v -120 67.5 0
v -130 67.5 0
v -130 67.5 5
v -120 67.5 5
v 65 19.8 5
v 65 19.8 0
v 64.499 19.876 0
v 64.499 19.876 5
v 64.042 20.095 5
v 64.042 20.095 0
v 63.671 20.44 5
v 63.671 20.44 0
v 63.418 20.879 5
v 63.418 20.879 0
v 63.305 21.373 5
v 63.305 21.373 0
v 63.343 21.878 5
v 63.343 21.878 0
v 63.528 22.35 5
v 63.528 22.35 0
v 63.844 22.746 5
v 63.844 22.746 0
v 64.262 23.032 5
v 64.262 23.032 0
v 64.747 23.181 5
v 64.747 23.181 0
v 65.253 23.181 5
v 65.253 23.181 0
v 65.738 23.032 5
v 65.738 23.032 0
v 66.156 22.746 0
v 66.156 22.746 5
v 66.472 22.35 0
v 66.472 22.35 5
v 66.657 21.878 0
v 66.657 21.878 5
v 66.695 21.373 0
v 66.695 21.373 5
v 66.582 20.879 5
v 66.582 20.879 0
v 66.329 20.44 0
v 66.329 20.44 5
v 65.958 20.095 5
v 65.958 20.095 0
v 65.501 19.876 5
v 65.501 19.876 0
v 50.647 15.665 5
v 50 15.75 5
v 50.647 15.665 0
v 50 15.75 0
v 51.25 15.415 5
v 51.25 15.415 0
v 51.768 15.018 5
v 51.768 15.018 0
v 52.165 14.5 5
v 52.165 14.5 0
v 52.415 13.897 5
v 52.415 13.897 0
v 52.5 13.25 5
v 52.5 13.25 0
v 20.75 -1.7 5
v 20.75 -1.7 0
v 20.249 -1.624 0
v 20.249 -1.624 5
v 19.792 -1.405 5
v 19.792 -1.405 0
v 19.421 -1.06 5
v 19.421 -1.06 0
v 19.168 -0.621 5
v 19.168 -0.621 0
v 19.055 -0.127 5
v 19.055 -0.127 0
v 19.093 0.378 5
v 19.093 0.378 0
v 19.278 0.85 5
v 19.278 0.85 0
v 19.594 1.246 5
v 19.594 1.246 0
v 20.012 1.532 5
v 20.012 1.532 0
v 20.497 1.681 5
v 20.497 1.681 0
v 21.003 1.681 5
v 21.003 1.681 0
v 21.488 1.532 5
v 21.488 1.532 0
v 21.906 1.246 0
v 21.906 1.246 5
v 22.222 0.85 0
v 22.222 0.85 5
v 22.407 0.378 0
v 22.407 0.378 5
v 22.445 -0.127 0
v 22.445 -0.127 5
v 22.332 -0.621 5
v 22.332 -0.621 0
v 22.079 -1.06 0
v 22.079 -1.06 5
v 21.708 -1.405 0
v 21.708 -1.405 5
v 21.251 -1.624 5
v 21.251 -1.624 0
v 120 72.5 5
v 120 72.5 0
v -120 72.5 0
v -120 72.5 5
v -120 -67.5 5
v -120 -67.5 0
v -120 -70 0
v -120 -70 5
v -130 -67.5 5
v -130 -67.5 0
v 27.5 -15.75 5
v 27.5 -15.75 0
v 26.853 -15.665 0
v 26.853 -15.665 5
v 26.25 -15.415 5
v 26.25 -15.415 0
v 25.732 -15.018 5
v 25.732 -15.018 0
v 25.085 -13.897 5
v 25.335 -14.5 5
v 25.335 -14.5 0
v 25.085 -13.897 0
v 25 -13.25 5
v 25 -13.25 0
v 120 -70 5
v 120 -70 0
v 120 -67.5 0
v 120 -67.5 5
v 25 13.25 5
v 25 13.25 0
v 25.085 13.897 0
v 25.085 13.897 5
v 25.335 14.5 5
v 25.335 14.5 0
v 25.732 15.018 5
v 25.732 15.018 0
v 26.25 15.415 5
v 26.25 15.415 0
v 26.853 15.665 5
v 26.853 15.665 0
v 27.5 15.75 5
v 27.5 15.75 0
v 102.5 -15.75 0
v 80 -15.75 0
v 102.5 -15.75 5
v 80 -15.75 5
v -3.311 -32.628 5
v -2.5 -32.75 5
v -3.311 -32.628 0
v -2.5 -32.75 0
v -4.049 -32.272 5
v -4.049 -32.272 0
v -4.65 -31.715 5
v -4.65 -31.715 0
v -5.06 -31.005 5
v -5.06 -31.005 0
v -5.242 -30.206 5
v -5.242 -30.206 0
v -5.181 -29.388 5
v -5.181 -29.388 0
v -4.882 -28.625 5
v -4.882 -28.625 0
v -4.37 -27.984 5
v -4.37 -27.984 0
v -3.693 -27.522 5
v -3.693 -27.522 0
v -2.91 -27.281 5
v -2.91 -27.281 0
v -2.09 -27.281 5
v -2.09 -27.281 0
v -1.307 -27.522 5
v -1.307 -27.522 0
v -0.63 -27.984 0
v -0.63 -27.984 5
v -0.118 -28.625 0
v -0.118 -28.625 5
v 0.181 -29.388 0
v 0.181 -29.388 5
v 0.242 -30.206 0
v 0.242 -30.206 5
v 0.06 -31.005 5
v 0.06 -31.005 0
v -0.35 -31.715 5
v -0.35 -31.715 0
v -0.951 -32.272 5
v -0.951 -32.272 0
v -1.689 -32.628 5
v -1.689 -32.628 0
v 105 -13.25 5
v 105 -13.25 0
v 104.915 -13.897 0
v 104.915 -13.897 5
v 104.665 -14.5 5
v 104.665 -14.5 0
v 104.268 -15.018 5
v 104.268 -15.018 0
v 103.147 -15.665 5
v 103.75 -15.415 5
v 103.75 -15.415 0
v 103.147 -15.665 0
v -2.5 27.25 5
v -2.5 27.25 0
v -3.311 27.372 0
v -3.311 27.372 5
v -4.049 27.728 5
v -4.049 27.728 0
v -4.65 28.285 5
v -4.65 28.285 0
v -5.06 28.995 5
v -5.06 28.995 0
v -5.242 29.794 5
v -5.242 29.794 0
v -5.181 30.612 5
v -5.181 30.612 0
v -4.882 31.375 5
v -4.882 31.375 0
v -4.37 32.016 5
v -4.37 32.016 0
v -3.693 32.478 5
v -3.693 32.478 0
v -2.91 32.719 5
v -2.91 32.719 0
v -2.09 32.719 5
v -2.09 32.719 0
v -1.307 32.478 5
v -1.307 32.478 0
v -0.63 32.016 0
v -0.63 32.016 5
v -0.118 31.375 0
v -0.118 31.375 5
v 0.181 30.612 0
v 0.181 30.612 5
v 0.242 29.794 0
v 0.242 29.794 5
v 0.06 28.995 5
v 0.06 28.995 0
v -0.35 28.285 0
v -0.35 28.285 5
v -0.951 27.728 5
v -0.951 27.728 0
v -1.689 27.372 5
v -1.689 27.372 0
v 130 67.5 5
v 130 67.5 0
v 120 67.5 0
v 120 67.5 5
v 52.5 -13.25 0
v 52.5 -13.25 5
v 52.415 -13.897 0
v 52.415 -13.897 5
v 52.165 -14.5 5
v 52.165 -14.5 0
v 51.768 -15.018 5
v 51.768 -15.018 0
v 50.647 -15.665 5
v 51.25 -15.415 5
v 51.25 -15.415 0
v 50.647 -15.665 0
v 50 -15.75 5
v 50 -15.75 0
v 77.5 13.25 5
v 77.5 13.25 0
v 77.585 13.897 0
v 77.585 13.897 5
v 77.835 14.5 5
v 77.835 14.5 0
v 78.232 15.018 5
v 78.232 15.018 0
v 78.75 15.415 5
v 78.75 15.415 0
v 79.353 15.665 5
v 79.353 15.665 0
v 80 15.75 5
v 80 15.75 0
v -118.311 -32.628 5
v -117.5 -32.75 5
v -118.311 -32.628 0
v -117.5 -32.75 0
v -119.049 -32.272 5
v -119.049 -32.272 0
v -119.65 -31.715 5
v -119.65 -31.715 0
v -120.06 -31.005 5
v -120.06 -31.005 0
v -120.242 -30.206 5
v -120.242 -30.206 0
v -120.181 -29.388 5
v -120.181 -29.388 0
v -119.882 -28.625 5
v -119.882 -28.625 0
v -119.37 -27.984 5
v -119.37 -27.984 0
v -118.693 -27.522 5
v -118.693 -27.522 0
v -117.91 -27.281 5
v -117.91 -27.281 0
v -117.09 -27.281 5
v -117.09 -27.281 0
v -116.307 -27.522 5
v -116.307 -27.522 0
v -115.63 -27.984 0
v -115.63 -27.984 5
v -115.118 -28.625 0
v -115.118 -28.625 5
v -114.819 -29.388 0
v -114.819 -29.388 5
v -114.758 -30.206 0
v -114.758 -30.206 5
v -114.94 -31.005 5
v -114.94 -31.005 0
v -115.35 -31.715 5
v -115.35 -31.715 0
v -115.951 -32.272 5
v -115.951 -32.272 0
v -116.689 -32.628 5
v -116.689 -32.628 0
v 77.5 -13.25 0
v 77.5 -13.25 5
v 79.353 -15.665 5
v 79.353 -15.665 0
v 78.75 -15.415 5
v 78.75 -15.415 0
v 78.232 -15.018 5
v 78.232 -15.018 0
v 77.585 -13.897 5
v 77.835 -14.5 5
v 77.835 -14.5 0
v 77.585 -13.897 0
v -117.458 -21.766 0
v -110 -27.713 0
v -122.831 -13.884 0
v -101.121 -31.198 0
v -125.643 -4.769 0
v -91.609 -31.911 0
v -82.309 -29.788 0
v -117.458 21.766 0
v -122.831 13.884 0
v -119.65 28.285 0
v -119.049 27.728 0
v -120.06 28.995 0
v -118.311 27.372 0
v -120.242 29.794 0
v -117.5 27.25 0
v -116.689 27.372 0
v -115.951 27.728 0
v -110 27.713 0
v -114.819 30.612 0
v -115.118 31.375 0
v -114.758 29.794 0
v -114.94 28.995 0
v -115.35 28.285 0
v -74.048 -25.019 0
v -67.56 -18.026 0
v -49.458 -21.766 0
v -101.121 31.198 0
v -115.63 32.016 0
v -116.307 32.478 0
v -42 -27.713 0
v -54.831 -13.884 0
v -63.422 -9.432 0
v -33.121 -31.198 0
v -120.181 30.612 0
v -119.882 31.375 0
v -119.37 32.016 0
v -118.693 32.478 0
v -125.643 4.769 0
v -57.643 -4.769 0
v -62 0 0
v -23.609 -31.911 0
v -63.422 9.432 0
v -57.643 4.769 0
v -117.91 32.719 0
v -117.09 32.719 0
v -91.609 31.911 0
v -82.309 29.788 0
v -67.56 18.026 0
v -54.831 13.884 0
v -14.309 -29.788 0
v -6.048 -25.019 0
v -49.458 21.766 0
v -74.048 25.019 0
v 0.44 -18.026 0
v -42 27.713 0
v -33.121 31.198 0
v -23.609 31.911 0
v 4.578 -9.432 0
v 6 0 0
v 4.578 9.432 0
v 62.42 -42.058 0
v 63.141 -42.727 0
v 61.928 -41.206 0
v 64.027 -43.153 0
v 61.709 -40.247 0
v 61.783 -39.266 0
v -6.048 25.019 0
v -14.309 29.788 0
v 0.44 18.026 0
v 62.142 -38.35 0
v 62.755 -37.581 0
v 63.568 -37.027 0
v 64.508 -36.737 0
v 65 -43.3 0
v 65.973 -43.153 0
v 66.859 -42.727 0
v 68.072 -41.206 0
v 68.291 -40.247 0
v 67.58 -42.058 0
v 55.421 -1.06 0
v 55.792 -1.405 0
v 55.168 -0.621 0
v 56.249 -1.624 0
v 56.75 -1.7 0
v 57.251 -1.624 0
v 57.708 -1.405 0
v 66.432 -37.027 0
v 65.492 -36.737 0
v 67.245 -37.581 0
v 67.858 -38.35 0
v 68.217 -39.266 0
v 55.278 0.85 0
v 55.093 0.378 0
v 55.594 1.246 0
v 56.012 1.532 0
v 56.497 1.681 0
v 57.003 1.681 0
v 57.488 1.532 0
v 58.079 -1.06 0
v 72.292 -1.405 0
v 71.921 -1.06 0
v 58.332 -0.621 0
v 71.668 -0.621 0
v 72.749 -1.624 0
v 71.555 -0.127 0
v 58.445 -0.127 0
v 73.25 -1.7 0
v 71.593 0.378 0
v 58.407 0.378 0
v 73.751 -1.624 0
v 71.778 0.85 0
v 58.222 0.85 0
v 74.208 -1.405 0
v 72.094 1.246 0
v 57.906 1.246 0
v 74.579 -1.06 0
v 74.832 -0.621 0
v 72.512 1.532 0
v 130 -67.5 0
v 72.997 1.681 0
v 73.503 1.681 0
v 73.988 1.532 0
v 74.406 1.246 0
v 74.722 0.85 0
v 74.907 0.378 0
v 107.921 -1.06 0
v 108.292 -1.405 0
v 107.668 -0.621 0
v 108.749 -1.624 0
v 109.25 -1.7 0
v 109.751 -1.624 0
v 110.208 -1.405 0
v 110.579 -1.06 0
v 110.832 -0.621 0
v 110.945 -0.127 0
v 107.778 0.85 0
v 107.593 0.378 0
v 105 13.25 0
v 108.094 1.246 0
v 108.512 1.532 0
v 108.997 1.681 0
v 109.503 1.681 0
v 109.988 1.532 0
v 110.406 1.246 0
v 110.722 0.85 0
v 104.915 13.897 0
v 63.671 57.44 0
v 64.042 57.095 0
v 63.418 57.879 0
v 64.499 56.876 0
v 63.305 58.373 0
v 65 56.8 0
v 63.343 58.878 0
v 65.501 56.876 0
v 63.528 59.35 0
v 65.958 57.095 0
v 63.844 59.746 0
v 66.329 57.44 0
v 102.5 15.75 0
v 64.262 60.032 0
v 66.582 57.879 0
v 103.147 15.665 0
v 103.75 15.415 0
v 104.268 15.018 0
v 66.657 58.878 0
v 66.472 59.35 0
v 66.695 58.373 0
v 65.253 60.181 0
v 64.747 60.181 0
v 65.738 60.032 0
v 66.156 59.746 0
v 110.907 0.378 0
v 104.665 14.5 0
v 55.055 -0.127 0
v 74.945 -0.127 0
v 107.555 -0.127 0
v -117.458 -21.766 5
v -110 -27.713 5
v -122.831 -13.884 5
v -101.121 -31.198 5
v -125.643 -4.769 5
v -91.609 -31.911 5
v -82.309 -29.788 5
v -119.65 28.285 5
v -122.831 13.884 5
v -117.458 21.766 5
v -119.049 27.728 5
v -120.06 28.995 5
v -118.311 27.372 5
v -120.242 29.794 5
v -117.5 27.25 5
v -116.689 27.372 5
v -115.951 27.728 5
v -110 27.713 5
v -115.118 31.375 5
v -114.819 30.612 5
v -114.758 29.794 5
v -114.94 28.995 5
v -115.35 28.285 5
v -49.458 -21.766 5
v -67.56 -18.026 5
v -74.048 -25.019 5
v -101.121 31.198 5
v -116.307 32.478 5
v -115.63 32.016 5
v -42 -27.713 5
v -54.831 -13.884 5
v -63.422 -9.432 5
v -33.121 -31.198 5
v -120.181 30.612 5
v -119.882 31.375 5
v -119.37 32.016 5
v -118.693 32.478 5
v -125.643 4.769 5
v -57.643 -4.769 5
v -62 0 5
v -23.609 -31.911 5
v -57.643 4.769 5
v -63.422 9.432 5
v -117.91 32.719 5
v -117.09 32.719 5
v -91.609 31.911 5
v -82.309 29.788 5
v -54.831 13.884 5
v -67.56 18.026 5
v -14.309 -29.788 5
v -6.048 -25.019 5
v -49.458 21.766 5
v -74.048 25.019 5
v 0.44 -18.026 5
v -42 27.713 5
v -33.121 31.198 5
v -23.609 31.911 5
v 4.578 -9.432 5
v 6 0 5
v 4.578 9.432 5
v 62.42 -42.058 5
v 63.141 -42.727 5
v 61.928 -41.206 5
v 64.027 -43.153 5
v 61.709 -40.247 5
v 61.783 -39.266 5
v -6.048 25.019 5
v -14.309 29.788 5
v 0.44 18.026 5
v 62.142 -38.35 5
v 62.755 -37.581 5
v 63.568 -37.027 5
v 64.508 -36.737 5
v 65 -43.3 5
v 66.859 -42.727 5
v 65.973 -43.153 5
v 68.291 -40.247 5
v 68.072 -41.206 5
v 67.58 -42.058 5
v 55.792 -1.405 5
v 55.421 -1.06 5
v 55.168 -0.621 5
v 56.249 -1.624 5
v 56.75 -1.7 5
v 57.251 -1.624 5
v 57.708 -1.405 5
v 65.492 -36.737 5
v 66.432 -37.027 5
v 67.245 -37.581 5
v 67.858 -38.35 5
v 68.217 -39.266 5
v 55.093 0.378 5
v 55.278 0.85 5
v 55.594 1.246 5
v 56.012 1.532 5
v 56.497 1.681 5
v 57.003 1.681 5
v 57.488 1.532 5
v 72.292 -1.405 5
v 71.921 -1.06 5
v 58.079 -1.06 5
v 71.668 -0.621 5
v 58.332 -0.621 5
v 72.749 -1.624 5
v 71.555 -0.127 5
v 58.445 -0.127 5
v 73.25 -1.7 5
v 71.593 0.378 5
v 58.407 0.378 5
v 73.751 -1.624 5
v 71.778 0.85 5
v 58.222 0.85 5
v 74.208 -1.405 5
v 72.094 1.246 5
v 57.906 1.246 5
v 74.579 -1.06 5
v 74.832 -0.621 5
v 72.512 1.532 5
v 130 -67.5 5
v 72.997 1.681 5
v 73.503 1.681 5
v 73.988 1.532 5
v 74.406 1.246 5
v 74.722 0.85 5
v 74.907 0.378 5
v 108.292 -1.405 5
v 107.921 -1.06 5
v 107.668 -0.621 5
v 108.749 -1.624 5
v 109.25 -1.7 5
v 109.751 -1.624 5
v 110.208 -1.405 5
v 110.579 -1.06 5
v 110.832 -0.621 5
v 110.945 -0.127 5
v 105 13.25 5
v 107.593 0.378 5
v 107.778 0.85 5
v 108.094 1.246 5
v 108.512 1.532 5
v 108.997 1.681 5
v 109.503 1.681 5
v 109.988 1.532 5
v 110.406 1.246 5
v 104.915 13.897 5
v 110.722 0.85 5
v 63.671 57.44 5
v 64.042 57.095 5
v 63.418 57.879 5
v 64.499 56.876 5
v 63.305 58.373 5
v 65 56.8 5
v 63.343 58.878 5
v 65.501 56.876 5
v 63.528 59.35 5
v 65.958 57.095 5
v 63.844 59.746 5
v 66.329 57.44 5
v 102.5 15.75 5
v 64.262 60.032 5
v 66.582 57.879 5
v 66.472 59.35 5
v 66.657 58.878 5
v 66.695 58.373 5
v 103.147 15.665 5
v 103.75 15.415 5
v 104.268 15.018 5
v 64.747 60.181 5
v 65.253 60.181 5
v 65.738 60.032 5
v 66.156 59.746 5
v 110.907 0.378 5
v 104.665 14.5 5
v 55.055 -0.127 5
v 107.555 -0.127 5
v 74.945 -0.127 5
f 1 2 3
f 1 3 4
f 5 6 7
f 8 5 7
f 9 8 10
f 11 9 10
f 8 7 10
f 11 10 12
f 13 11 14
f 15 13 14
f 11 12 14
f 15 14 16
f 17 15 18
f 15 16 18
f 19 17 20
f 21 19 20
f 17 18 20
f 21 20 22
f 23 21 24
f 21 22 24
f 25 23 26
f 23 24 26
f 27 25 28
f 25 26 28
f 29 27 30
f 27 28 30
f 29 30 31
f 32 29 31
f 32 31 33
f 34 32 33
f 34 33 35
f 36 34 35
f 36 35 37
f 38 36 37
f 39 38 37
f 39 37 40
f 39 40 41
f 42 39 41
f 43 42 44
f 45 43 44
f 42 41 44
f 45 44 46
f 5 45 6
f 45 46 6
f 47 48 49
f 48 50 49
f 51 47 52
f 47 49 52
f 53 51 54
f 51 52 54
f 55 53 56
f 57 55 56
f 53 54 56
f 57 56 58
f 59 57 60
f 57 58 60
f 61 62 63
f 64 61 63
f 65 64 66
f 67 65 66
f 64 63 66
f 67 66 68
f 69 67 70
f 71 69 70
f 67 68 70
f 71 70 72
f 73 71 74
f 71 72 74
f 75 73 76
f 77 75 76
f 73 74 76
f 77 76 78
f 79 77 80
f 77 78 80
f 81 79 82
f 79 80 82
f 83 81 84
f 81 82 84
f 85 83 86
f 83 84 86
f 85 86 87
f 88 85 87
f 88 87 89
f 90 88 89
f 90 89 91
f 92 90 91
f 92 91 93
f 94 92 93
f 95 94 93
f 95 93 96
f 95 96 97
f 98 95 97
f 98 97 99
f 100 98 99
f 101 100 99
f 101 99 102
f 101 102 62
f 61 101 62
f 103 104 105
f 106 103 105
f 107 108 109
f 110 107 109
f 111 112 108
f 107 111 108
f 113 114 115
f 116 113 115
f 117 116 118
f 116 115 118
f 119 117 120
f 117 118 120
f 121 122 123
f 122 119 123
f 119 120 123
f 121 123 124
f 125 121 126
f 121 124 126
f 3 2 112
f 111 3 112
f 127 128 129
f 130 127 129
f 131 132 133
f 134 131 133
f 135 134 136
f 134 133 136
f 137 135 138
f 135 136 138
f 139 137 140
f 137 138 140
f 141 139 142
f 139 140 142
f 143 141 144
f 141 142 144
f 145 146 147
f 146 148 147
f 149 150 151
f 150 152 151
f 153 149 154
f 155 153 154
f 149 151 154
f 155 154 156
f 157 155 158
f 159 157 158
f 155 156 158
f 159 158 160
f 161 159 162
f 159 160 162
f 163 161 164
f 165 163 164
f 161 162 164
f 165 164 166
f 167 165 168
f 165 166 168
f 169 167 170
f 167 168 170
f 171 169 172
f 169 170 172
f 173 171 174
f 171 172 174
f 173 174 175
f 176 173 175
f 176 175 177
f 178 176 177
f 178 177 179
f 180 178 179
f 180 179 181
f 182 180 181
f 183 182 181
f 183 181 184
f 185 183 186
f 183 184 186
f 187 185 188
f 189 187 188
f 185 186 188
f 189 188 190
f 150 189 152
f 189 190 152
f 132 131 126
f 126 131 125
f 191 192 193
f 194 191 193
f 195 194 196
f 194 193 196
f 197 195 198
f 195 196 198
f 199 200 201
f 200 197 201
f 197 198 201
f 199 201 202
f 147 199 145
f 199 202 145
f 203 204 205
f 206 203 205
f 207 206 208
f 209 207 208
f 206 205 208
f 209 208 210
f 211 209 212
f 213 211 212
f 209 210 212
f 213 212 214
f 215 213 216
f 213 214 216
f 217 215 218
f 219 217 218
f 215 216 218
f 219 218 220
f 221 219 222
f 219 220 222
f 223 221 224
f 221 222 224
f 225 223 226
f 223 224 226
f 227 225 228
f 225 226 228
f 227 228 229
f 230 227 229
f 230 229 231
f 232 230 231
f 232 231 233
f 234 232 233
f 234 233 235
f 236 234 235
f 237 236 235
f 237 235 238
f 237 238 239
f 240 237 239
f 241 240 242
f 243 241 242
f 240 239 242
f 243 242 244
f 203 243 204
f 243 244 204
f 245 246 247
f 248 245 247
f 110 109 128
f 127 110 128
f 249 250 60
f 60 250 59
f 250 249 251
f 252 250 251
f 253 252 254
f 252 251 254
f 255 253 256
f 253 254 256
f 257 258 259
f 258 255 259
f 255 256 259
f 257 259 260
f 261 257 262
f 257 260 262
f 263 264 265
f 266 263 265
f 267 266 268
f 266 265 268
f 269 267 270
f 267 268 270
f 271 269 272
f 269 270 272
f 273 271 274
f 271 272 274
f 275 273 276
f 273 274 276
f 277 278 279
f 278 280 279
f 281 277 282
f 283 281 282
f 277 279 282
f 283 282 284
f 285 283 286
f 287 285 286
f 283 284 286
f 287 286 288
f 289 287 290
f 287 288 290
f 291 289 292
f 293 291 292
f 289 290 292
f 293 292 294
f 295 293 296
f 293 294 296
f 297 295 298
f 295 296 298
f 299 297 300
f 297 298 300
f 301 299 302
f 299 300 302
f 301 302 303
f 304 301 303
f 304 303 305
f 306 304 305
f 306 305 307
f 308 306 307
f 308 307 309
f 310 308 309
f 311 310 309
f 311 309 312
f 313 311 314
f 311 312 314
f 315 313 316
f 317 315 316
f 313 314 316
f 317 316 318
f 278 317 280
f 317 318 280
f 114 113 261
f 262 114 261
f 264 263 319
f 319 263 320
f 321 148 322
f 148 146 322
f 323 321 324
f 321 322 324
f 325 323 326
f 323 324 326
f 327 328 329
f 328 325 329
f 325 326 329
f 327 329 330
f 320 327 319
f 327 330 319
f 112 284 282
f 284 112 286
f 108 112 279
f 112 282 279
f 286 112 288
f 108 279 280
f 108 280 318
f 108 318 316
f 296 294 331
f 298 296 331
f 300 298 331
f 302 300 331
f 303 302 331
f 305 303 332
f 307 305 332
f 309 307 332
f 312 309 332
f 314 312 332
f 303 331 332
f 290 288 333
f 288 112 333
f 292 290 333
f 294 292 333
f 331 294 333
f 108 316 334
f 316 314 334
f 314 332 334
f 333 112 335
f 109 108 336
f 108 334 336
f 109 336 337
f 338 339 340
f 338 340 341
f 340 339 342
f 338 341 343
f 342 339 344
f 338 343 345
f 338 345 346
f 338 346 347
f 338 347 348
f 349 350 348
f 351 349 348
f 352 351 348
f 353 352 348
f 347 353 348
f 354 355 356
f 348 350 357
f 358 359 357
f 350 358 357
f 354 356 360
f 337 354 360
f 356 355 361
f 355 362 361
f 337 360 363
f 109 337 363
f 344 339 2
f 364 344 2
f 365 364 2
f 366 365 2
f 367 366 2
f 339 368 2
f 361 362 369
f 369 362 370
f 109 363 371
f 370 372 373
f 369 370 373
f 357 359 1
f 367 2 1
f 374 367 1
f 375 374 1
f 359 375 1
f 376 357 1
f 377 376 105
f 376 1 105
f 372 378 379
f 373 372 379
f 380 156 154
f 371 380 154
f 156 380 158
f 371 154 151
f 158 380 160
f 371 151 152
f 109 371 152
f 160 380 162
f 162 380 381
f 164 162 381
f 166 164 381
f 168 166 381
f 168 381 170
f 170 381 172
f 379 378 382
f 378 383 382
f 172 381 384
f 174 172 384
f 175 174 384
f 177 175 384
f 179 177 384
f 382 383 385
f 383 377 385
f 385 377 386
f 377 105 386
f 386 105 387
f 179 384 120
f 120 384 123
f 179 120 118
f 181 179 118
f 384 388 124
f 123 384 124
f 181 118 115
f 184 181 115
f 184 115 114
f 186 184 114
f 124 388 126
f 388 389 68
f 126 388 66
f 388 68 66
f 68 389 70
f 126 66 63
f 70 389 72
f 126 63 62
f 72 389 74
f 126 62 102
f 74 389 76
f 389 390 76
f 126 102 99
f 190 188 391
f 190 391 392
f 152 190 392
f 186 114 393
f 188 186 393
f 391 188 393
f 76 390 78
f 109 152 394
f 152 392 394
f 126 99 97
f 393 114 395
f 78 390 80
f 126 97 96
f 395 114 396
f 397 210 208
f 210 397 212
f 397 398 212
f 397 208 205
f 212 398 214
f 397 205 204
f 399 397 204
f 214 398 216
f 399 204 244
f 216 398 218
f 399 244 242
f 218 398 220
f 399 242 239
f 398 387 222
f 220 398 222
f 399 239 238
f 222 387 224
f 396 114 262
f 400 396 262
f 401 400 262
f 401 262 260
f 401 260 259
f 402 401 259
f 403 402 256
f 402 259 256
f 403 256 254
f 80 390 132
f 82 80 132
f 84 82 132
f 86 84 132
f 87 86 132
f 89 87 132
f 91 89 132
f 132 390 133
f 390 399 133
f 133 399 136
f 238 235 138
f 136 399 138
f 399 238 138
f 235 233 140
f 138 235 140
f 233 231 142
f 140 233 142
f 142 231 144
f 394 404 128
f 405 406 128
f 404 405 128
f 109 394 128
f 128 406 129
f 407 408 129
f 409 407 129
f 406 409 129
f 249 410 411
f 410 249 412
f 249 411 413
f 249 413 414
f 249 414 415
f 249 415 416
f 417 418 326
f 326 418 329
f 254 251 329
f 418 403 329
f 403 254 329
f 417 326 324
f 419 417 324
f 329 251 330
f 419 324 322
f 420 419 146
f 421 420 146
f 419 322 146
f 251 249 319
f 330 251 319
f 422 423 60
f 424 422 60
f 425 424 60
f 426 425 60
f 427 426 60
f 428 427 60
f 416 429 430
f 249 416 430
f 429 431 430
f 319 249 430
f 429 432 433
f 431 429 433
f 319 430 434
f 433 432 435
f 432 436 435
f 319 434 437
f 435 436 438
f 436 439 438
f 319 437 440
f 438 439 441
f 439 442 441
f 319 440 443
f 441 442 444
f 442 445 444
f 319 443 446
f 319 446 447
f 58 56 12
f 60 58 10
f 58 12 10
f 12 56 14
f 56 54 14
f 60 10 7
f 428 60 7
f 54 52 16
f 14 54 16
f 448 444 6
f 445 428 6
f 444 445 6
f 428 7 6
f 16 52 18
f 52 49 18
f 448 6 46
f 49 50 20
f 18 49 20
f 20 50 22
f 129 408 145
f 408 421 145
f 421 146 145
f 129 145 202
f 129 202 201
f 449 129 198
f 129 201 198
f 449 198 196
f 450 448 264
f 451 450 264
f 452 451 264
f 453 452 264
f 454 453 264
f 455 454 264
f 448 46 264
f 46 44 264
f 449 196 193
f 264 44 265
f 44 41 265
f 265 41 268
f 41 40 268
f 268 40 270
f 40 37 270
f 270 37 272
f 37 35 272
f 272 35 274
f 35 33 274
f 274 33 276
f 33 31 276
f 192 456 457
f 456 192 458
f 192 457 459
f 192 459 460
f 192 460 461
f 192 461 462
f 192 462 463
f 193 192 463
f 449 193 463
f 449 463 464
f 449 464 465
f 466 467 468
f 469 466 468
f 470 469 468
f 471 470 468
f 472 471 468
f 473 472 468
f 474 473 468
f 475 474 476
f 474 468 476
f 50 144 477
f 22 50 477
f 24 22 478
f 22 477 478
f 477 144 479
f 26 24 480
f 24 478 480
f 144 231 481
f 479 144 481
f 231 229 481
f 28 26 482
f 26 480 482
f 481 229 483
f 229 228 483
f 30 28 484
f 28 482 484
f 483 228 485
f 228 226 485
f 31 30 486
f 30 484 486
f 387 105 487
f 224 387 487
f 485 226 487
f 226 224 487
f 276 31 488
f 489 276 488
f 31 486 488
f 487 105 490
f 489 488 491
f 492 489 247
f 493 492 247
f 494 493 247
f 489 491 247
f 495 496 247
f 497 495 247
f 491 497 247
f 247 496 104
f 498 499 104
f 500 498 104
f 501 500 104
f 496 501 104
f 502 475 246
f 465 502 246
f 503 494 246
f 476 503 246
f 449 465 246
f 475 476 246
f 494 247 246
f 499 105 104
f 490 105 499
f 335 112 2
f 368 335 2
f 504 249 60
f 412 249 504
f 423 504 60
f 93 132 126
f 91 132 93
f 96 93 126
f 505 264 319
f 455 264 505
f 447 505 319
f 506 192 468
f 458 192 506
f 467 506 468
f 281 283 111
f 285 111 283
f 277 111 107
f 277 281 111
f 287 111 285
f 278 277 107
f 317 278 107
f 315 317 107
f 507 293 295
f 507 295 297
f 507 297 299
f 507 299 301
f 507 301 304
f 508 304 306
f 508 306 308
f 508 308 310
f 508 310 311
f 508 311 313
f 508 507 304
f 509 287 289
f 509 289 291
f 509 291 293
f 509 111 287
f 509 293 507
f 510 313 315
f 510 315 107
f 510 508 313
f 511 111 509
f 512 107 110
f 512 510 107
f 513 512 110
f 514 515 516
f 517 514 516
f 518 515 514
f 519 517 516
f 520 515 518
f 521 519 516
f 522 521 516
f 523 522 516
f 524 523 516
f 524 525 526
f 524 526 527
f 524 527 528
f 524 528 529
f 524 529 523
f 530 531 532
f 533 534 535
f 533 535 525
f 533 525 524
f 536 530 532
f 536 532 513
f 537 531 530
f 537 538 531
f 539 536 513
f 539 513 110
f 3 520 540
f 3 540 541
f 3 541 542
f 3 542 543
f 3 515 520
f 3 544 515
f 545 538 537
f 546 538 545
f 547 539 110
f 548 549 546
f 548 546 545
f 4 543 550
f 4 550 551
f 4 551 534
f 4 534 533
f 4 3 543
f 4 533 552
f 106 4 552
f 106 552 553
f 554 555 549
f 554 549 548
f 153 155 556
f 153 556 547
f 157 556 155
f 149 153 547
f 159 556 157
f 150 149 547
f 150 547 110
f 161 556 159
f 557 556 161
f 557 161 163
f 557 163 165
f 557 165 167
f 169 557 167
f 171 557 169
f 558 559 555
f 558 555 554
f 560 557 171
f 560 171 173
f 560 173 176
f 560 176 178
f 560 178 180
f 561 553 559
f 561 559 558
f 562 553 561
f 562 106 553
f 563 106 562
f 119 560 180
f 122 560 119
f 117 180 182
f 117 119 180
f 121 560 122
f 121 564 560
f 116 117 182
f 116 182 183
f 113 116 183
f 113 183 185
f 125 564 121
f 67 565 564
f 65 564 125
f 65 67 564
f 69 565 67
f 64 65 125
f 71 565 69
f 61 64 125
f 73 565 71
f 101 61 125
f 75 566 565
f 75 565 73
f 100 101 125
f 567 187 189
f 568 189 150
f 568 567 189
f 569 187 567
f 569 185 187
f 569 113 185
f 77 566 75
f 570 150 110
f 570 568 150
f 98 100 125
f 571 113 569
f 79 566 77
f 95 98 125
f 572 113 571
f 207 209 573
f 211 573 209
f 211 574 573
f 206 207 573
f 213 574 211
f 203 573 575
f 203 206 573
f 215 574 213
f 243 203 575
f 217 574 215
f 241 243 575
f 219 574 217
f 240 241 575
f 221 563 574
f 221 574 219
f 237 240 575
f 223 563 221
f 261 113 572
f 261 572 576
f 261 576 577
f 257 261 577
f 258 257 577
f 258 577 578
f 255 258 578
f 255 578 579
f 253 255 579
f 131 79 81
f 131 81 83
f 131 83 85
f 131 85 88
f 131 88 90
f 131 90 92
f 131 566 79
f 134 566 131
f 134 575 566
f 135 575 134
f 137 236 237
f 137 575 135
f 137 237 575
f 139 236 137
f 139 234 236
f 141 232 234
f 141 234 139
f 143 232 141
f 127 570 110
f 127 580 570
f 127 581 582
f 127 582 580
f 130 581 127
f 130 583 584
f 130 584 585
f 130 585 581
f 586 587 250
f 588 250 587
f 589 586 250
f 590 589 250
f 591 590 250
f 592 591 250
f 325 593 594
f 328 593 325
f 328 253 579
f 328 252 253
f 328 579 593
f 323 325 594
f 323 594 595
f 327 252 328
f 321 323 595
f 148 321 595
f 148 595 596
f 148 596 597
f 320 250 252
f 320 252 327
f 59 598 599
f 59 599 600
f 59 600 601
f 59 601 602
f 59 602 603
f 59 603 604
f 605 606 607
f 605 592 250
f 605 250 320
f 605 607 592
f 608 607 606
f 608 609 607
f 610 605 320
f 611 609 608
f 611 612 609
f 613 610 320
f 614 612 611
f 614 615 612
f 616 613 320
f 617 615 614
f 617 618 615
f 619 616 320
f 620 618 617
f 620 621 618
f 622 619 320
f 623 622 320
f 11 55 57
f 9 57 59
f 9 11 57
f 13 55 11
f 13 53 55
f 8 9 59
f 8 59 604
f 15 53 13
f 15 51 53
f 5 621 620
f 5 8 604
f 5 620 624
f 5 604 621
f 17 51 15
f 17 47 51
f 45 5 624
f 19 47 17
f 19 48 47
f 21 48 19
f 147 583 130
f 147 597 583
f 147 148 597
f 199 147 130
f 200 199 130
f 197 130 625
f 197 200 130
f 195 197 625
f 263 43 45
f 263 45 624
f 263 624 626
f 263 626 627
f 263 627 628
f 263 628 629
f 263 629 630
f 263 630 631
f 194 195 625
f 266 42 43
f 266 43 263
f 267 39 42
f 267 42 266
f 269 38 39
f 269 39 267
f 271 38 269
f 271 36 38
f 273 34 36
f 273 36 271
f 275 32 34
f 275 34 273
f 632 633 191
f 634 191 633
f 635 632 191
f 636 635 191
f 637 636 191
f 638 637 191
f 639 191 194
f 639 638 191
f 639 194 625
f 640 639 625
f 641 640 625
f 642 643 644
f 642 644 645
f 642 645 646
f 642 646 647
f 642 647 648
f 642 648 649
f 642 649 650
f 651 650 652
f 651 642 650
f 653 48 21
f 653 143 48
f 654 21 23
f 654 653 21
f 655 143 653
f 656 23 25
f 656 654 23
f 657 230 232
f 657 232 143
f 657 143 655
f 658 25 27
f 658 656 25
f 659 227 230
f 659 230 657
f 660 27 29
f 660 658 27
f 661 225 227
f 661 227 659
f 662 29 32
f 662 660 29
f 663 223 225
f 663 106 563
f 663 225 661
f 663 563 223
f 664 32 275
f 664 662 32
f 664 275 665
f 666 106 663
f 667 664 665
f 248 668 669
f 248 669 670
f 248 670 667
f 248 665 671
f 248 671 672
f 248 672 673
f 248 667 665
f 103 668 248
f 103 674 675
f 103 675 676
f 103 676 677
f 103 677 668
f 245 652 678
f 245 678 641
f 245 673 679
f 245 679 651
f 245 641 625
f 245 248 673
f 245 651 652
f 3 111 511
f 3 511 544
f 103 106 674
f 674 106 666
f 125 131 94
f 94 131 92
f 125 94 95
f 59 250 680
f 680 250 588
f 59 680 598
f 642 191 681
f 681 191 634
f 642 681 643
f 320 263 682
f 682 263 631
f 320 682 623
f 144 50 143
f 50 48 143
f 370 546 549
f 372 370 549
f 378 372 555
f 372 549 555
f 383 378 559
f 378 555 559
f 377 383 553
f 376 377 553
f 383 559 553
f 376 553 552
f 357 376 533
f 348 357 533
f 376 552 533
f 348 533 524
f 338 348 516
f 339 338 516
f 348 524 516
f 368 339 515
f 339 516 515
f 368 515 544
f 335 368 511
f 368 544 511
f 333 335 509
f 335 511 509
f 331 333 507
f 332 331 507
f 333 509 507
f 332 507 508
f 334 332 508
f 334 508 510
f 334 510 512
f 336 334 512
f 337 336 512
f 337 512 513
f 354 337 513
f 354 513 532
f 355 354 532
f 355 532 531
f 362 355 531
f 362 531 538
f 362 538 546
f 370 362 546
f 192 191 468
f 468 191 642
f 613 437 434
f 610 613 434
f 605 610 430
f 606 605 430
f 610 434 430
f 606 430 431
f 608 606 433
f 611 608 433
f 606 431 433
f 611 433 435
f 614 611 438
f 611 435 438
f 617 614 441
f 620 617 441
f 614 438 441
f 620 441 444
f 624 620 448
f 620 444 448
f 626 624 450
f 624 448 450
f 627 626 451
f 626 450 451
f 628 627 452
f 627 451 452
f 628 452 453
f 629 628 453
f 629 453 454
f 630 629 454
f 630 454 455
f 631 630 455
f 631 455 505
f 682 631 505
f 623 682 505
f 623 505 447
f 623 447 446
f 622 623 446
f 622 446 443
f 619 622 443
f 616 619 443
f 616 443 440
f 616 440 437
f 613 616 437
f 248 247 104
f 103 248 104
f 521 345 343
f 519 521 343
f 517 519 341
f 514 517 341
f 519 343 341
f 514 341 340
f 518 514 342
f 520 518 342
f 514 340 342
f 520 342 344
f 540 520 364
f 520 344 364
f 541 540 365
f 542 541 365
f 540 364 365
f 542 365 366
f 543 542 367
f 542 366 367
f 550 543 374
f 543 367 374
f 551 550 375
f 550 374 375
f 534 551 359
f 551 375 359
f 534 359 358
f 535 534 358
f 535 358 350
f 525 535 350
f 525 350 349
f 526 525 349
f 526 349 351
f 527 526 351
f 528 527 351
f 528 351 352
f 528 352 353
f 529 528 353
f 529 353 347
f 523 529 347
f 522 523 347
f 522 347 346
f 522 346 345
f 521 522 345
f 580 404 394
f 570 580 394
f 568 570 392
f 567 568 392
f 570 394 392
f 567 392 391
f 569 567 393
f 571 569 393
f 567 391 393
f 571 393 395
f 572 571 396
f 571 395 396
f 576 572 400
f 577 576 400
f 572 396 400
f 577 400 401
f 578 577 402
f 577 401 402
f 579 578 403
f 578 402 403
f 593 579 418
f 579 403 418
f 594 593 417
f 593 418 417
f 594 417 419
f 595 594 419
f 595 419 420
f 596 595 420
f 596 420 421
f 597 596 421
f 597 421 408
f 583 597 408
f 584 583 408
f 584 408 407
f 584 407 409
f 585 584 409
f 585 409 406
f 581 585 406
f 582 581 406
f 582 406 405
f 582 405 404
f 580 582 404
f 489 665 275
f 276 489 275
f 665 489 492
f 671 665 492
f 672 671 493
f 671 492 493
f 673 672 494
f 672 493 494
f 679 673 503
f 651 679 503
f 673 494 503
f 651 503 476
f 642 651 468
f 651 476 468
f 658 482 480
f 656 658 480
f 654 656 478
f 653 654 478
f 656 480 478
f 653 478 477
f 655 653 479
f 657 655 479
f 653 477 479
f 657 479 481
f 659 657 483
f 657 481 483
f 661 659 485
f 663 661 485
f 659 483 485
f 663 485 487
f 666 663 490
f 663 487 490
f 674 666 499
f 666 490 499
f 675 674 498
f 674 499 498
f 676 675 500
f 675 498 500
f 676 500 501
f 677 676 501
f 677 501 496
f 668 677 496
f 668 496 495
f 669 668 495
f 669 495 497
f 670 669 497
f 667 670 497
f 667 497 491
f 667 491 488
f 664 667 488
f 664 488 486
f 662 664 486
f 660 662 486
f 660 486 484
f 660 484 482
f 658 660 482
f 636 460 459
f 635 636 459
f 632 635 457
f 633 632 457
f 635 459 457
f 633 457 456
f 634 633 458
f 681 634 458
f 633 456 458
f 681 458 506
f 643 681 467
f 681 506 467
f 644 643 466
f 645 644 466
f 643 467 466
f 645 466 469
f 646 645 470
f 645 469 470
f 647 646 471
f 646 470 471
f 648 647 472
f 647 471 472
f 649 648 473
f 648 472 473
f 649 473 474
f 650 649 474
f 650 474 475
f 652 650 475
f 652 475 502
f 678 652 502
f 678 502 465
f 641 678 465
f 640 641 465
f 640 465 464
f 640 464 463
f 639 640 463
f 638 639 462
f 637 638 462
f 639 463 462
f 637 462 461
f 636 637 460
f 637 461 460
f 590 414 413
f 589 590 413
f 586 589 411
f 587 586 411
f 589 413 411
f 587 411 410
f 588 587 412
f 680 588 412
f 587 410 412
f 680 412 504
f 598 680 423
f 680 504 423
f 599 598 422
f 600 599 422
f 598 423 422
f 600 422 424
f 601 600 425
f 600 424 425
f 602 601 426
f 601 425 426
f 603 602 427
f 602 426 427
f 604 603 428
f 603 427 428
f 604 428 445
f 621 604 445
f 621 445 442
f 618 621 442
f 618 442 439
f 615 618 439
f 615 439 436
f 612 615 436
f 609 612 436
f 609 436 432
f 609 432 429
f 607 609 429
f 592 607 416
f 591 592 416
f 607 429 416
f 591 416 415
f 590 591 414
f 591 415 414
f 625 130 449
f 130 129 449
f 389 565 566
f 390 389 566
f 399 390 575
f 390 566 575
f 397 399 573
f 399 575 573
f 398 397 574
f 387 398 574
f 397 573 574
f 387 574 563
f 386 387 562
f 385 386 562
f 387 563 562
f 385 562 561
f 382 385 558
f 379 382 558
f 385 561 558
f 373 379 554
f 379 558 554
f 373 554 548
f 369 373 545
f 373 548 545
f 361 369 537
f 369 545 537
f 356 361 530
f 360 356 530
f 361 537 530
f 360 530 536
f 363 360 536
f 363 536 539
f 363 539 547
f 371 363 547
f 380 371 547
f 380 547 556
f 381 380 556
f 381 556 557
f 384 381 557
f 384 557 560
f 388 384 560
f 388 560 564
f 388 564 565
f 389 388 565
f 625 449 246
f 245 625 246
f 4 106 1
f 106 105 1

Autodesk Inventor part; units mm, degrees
ref_plane "YZ Plane" through (0, 0, 0) normal (1, 0, 0) x (0, 1, 0)
ref_plane "XZ Plane" through (0, 0, 0) normal (0, 1, 0) x (-1, 0, 0)
ref_plane "XY Plane" through (0, 0, 0) normal (0, 0, 1) x (1, 0, 0)
sketch "Sketch1" plane through (0, 0, 0) normal (0, 0, 1) x (1, 0, 0)
  line L0 (-130, 67.5) -> (-130, -67.5)
  line L1 (-130, -67.5) -> (-120, -67.5)
  line L2 (-120, -67.5) -> (-120, -70)
  line L3 (-120, -70) -> (120, -70)
  line L4 (120, -70) -> (120, -67.5)
  line L5 (120, -67.5) -> (130, -67.5)
  line L6 (130, -67.5) -> (130, 67.5)
  line L7 (130, 67.5) -> (120, 67.5)
  line L8 (120, 67.5) -> (120, 72.5)
  line L9 (120, 72.5) -> (-120, 72.5)
  line L10 (-120, 72.5) -> (-120, 67.5)
  line L11 (-130, 67.5) -> (-120, 67.5)
  point P0 (0, 0)
  point P1 (0, 72.5)
  point P2 (130, 0)
  point P3 (-130, 0)
  dimension "d0" = 5
  dimension "d1" = 240
  dimension "d2" = 10
  dimension "d3" = 10
  dimension "d4" = 2.5
  dimension "d5" = 135
extrude "Extrusion1" add sketch "Sketch1" along normal blind 5
sketch "Sketch2" plane through (0, 0, 5) normal (0, 0, 1) x (1, 0, 0)
  line L0 (25, -15.75) -> (52.5, -15.75)
  line L1 (52.5, -15.75) -> (52.5, 15.75)
  line L2 (52.5, 15.75) -> (25, 15.75)
  line L3 (25, 15.75) -> (25, -15.75)
  line L4 (77.5, -15.75) -> (105, -15.75)
  line L5 (105, -15.75) -> (105, 15.75)
  line L6 (105, 15.75) -> (77.5, 15.75)
  line L7 (77.5, 15.75) -> (77.5, -15.75)
  line L8 (130, -67.5) -> (130, 67.5) projected
  point P0 (0, 0)
  point P1 (25, 0)
  point P2 (77.5, 0)
  dimension "d8" = 27.5
  dimension "d9" = 31.5
  dimension "d10" = 27.5
  dimension "d11" = 31.5
  dimension "d12" = 130
  dimension "d13" = 25
  dimension "d14" = 25
extrude "Extrusion2" cut sketch "Sketch2" against normal through all
sketch "Sketch3" plane through (0, 0, 5) normal (0, 0, 1) x (1, 0, 0)
  line L0 (20.75, 0) -> (56.75, 0) construction
  line L1 (25, 15.75) -> (52.5, 15.75) projected
  line L2 (77.5, 15.75) -> (105, 15.75) projected
  line L3 (73.25, 0) -> (109.25, 0) construction
  point P0 (0, 0)
  point P1 (38.75, 0)
  point P2 (38.75, 15.75)
  point P3 (91.25, 0)
  point P4 (91.25, 15.75)
  dimension "d17" = 36
  dimension "d18" = 36
hole "Hole1" at (20.75, 0, 5) at (56.75, 0, 5) at (73.25, 0, 5) at (109.25, 0, 5) direction (0, 0, -1) diameter 3.4 depth 8 tip angle 118 clearance for "Countersunk Flat Head Screw DIN EN ISO 2009" size "M3" standard "DIN"
fillet "Fillet1" radius 2.5 8 edges at (25, 15.75, 2.5) (77.5, 15.75, 2.5) (105, 15.75, 2.5) (52.5, 15.75, 2.5) (52.5, -15.75, 2.5) (105, -15.75, 2.5) (25, -15.75, 2.5) (77.5, -15.75, 2.5)
sketch "Sketch5" plane through (0, 0, 5) normal (0, 0, 1) x (1, 0, 0)
  circle A0 centre (-94, 0) radius 32
  circle A1 centre (-26, 0) radius 32
  line L0 (-130, 67.5) -> (-130, -67.5) projected
  point P0 (0, 0)
  dimension "d34" = 64
  dimension "d35" = 68
  dimension "d36" = 36
  dimension "d37" = 64
extrude "Extrusion3" cut sketch "Sketch5" against normal through all
sketch "Sketch6" plane through (0, 0, 5) normal (0, 0, 1) x (1, 0, 0)
  point P0 (0, 0)
  point P1 (65, -40)
  dimension "d40" = 65
  dimension "d60" = 40
hole "Hole3" at (65, -40, 5) direction (0, 0, -1) diameter 6.6 depth 8 tip angle 118 clearance for "Countersunk Flat Head Screw DIN EN ISO 2009" size "M6" standard "DIN"
sketch "Sketch7" plane through (0, 0, 5) normal (0, 0, 1) x (1, 0, 0)
  circle A0 centre (-94, 0) radius 32 construction
  circle A1 centre (-26, 0) radius 32 construction
  line L0 (-117.5, -30) -> (-2.5, -30) construction
  line L1 (-2.5, -30) -> (-2.5, 30) construction
  line L2 (-2.5, 30) -> (-117.5, 30) construction
  line L3 (-117.5, 30) -> (-117.5, -30) construction
  line L4 (-117.5, -30) -> (-2.5, 30) construction
  line L5 (-2.5, -30) -> (-117.5, 30) construction
  point P0 (0, 0)
  point P1 (-60, 0)
  point P2 (-60, 0)
  dimension "d49" = 68
  dimension "d50" = 34
  dimension "d51" = 115
  dimension "d52" = 60
hole "Hole4" at (-117.5, 30, 5) at (-117.5, -30, 5) at (-2.5, -30, 5) at (-2.5, 30, 5) direction (0, 0, -1) diameter 5.5 depth 8 tip angle 118 clearance for "Countersunk Flat Head Screw DIN EN ISO 2009" size "M5" standard "DIN"
sketch "Sketch8" plane through (0, 0, 5) normal (0, 0, 1) x (1, 0, 0)
  circle A0 centre (65, -40) radius 3.3 construction
  line L0 (65, 58.5) -> (65, 21.5) construction
  point P0 (0, 0)
  point P1 (65, 40)
  dimension "d62" = 37
  dimension "d63" = 40
  dimension "d71" = 0
hole "Hole5" at (65, 21.5, 5) at (65, 58.5, 5) direction (0, 0, -1) diameter 3.4 depth 8 tip angle 118 clearance for "Countersunk Flat Head Screw DIN EN ISO 2009" size "M3" standard "DIN"
equation "\"d13\" = -0.666667 * d8 + 0.333333 * d12"
equation "\"d14\" = d13"
equation "\"d50\" = 0.5 * d49"
properties part number "SeitenOben" material "Polycarbonate, Clear"
